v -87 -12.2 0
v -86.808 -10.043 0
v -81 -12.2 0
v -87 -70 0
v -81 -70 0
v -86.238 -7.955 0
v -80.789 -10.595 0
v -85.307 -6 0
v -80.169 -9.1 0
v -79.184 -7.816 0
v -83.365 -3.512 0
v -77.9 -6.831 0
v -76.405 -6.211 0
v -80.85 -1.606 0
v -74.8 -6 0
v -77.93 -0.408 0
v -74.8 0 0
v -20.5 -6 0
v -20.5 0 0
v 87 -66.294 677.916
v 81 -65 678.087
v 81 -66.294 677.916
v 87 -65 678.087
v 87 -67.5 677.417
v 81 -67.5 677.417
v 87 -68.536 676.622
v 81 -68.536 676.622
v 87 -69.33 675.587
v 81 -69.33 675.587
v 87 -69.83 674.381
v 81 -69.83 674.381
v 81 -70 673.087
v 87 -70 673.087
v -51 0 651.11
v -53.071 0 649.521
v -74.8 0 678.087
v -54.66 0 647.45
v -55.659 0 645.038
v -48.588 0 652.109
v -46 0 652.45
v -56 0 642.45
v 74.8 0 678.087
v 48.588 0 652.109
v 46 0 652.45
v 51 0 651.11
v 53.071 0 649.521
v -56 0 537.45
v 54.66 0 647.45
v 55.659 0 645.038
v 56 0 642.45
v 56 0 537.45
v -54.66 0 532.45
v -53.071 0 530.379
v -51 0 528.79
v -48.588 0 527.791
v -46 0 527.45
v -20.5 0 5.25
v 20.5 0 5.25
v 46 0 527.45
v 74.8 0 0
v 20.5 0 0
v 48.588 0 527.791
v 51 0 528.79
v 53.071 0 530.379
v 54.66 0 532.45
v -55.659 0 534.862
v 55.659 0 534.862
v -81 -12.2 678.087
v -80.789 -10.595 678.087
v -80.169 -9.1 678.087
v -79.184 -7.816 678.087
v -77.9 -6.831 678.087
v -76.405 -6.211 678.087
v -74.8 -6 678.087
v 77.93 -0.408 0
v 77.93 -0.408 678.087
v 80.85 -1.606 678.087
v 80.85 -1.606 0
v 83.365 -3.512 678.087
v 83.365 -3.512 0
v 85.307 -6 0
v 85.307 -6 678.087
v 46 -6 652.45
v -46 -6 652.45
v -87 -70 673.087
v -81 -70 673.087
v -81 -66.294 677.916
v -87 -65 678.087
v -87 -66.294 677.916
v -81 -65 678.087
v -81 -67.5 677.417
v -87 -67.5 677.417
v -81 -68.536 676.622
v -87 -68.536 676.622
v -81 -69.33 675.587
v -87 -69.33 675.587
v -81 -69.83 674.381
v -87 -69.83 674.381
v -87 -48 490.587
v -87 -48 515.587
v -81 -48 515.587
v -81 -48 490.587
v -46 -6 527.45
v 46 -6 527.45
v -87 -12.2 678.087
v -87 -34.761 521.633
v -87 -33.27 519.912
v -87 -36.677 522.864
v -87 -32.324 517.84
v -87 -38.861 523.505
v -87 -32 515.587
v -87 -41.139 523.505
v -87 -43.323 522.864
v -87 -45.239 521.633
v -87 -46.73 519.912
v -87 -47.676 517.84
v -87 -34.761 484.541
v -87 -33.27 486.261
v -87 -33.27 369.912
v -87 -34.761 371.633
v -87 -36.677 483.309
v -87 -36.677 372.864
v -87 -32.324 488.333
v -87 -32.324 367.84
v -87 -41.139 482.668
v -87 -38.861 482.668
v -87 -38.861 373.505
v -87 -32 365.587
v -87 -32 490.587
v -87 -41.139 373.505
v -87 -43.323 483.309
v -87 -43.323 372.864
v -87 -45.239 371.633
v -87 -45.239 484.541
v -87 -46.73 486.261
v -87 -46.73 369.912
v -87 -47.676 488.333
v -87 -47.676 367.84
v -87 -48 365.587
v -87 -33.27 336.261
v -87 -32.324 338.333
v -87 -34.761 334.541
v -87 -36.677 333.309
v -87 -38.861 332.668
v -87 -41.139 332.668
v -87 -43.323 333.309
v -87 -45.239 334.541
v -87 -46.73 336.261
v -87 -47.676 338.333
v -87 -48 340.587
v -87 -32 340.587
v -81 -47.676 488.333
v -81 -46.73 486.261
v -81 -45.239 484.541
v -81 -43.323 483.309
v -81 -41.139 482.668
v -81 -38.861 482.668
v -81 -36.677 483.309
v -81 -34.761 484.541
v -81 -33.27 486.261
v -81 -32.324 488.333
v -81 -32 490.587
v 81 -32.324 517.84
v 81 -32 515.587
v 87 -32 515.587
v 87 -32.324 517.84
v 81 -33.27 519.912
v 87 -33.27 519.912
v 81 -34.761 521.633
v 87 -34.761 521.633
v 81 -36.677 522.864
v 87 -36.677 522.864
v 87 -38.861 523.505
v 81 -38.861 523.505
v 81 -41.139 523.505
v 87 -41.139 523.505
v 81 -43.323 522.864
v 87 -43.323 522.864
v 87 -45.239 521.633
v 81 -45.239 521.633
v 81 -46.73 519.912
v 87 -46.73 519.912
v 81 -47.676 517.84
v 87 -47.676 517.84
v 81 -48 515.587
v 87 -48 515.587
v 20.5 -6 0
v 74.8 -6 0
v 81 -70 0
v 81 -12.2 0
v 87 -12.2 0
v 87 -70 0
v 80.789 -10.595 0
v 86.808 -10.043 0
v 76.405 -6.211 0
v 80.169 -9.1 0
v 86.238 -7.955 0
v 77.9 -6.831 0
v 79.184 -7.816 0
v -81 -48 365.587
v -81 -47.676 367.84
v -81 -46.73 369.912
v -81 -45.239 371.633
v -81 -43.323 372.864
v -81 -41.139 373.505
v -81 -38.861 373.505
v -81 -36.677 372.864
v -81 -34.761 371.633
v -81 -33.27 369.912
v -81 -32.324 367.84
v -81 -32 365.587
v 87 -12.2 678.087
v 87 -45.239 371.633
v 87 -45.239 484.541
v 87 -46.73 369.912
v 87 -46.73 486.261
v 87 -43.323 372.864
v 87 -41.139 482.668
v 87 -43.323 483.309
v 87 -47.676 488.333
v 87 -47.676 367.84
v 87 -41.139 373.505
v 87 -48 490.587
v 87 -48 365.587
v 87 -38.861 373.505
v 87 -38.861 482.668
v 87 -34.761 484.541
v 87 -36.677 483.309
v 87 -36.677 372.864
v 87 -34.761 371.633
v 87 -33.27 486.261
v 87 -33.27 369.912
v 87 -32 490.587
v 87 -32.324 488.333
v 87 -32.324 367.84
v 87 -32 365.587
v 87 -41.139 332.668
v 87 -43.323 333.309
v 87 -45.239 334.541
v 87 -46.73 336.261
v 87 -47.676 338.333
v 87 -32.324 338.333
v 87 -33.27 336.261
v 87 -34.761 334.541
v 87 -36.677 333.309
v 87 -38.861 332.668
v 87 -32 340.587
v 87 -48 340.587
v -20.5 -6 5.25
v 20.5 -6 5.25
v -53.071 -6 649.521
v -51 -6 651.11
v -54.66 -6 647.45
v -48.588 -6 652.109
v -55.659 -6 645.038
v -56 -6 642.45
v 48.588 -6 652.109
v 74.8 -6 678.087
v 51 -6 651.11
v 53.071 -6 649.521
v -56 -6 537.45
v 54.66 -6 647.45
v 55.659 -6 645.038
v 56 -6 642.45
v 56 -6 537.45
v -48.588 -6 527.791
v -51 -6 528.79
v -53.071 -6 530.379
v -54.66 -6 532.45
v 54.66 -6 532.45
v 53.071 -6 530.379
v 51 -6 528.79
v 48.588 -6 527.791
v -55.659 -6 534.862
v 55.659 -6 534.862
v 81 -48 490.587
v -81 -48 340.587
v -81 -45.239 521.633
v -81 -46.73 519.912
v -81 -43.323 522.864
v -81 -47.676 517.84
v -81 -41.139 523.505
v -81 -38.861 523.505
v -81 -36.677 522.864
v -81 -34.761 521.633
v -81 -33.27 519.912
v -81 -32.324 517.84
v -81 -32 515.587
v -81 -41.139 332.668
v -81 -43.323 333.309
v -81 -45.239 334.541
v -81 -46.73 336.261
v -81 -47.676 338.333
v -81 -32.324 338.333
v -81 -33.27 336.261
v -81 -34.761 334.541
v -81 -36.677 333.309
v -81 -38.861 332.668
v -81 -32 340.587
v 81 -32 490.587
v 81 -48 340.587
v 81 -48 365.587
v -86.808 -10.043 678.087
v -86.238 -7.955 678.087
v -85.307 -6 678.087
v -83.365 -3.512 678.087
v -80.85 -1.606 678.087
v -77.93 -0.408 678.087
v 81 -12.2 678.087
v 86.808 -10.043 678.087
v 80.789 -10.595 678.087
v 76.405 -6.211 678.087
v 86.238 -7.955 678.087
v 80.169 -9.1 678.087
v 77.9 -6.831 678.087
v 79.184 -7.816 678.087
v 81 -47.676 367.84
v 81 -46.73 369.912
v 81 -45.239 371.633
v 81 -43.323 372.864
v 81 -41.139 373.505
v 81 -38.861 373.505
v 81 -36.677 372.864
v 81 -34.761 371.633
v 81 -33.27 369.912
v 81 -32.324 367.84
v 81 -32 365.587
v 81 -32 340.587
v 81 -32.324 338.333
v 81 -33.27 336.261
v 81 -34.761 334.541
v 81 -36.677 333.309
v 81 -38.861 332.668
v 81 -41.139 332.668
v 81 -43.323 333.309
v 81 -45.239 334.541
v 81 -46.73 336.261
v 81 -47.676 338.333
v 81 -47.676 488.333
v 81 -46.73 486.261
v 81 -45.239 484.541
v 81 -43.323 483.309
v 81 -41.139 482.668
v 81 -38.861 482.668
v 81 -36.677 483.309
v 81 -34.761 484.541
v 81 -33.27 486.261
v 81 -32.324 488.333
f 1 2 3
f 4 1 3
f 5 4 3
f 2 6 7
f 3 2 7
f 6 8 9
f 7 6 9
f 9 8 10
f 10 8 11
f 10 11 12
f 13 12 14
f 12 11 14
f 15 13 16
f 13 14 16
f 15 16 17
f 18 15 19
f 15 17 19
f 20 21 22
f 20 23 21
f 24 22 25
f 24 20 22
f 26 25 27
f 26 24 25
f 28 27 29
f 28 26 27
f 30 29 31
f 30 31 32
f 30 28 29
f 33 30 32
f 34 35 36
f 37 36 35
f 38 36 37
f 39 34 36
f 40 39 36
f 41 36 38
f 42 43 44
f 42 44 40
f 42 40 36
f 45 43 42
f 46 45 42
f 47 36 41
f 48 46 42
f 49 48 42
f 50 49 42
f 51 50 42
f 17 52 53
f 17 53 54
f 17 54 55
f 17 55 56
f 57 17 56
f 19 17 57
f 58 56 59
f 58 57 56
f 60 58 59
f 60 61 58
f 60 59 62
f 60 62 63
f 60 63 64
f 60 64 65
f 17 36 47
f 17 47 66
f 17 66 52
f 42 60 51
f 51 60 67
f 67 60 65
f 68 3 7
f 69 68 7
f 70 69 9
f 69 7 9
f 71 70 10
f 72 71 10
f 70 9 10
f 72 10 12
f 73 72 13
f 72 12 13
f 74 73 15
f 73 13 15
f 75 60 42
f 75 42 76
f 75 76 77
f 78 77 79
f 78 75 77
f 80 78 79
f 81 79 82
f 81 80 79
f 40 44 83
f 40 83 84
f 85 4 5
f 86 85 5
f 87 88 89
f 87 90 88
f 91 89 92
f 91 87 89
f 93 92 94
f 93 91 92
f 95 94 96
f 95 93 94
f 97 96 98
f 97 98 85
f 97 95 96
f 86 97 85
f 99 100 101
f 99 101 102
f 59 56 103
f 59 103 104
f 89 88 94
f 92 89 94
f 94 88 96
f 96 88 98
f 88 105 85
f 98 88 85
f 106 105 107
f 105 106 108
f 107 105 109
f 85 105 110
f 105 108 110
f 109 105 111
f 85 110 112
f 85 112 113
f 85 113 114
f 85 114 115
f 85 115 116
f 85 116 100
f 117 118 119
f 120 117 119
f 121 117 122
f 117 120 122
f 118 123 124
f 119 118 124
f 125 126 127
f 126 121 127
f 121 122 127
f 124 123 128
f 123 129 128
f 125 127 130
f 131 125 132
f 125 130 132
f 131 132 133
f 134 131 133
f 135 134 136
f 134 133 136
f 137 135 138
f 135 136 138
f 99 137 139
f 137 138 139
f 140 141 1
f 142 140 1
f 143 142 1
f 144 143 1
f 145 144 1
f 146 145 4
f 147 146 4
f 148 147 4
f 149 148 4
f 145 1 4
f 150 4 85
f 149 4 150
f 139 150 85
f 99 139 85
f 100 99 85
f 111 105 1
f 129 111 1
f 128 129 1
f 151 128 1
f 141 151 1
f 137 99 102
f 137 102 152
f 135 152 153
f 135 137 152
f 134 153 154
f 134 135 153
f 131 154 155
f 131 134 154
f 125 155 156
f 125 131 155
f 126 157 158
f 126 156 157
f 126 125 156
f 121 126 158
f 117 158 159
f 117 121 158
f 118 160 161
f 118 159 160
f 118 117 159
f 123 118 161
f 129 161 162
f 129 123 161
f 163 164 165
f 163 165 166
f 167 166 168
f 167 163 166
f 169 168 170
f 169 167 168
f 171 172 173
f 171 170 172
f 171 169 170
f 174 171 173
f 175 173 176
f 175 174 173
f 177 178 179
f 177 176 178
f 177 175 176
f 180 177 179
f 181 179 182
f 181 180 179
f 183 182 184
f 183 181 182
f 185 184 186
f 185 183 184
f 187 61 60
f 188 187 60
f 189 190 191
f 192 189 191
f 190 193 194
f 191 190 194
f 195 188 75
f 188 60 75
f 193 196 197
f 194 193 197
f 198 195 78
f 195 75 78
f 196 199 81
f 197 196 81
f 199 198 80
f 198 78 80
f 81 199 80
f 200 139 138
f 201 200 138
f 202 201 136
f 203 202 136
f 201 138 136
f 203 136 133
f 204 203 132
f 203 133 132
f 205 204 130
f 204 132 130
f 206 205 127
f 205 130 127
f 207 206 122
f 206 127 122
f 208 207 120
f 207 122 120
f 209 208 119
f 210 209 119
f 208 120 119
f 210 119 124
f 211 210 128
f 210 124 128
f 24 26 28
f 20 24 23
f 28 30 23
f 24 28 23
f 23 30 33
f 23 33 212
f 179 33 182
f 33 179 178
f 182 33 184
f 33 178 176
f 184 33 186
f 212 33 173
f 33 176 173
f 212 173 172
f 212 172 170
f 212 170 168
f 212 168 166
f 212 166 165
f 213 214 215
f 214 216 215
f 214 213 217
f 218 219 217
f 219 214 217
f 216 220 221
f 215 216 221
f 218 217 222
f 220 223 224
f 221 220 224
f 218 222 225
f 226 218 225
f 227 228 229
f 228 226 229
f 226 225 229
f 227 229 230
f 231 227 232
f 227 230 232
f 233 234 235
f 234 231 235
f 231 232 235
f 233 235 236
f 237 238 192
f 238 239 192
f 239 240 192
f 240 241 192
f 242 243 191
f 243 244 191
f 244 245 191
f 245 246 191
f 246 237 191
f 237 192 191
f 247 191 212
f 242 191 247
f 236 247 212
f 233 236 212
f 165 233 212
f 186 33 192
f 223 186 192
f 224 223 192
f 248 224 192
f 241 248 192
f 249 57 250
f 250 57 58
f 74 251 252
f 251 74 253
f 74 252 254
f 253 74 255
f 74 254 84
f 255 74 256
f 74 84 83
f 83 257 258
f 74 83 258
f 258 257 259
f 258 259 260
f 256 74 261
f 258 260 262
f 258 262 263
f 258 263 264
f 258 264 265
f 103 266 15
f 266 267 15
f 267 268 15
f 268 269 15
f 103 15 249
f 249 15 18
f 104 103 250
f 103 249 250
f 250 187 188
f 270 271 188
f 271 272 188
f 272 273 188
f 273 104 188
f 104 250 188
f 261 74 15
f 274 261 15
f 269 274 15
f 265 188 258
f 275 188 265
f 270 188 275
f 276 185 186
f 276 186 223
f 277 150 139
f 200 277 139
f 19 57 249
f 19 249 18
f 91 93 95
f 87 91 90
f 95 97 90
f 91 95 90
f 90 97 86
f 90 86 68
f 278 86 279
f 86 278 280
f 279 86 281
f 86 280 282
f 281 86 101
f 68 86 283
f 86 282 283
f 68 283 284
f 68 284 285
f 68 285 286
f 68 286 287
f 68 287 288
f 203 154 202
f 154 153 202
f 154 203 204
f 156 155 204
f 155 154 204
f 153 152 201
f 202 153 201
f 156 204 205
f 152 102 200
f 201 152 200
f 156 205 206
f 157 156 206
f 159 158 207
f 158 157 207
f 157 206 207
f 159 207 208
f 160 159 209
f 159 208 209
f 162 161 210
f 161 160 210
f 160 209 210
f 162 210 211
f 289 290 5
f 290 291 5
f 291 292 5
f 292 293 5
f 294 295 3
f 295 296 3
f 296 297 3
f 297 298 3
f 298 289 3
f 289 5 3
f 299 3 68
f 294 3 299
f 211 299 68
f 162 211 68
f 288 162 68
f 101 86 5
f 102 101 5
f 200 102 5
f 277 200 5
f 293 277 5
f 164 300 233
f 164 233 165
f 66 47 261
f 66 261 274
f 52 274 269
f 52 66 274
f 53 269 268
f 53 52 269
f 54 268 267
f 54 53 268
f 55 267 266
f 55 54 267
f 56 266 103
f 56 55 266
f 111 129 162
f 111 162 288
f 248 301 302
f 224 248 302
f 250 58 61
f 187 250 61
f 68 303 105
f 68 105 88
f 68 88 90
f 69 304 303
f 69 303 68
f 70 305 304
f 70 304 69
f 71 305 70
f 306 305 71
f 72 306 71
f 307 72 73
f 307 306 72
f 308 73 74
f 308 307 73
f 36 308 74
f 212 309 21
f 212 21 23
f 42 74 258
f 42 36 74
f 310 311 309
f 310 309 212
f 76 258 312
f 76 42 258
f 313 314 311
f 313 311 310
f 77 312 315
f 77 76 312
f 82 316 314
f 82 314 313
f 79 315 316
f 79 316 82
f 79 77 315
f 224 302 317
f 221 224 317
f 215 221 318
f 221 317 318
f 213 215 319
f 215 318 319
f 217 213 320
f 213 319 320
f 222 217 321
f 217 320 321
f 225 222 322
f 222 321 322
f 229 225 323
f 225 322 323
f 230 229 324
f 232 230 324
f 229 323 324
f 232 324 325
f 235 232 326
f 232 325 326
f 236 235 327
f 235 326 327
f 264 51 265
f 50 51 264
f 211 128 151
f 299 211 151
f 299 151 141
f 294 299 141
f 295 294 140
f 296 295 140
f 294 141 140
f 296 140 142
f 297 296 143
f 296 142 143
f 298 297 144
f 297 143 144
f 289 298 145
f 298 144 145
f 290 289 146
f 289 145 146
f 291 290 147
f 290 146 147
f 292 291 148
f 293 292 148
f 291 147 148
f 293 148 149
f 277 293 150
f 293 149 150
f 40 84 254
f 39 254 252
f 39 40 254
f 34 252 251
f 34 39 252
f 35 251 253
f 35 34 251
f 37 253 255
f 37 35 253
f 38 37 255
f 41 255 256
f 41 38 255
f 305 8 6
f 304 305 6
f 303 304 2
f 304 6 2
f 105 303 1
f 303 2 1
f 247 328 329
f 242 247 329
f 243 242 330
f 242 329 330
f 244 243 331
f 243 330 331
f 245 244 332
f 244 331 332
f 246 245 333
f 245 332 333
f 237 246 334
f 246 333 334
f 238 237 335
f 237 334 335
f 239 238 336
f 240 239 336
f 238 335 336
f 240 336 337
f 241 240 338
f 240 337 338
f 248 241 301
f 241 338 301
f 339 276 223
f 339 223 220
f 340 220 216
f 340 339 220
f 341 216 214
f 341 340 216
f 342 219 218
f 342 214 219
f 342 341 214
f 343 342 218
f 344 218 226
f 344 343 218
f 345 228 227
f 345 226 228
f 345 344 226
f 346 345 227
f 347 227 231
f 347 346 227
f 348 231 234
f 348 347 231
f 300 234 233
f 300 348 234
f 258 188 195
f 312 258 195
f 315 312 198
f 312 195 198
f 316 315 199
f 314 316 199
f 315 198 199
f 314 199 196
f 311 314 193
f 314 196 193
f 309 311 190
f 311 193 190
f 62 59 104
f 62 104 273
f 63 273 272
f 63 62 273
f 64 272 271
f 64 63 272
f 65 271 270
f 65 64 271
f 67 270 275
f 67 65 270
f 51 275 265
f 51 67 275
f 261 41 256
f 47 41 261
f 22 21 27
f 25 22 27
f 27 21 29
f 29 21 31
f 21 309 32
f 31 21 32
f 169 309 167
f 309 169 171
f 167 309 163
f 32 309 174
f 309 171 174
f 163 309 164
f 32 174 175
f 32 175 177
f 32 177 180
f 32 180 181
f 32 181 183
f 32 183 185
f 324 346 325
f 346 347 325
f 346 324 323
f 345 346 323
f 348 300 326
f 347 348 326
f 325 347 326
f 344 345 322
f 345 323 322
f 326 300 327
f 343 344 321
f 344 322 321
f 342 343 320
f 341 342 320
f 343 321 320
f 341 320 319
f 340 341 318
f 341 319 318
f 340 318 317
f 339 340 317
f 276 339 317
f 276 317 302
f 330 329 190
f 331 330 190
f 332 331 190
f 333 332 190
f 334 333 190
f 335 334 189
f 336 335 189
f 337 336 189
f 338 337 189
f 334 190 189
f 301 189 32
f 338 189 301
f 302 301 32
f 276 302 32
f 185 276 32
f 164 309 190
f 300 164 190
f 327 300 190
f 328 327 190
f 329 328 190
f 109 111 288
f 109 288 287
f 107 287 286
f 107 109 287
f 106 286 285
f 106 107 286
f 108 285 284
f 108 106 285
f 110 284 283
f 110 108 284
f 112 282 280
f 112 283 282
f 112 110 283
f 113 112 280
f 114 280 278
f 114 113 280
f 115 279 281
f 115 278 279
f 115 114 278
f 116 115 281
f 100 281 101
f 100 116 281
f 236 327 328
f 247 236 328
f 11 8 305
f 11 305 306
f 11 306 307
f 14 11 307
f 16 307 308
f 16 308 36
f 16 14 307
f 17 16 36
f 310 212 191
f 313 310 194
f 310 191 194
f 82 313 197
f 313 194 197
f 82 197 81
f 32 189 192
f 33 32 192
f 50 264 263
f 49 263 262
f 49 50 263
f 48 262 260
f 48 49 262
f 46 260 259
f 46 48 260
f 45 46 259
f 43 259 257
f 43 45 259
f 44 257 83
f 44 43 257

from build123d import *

# Parameters (mm, degrees)
BOSS_EXTRUDE1_DEPTH        = 955
FLATTEN_BENDS1_OUTLINE_W   = 6
FLATTEN_BENDS1_OUTLINE_H   = 64
FLATTEN_BENDS1_DEPTH       = 955
FLATTEN_BENDS1_2_OUTLINE_W = 59.495264307
FLATTEN_BENDS1_2_OUTLINE_H = 6
FLATTEN_BENDS1_2_DEPTH     = 955
PROCESS_BENDS1_DEPTH       = 955
PROCESS_BENDS1_2_DEPTH     = 955
BOSS_EXTRUDE2_DEPTH        = 6
EDGE_FLANGE1_DEPTH         = 206.725155702
EDGE_FLANGE1_BEND_DEPTH    = 206.725155702
CUT_EXTRUDE1_DEPTH         = 15
CUT_EXTRUDE2_START         = -25.25
CUT_EXTRUDE2_DEPTH         = 25.25
SKETCH17_W                 = 20.5
SKETCH17_H                 = 7
CUT_EXTRUDE3_DEPTH         = 10
FILLET1_R                  = 10
SKETCH18_W                 = 41
SKETCH18_H                 = 5.25
CUT_EXTRUDE4_DEPTH         = 10
SKETCH19_W                 = 174
SKETCH19_H                 = 480
CUT_EXTRUDE5_DEPTH         = 1164.457508004
FILLET2_R                  = 5
CUT_EXTRUDE6_DEPTH         = 704.546245741


# Read off the part's stored shape, not the designer's step: Flatten-Bends1, Process-Bends1, Cut-Extrude2
# Sheet-metal steps are written as plain solids
with BuildPart() as part:
    # Sketch1 → Boss-Extrude1 (new body)
    with BuildSketch(Plane.XY):
        Polygon((-87, -70), (-87, 0), (87, 0), (87, -70), (81, -70), (81, -6), (-81, -6), (-81, -70), align=None)
    extrude(amount=BOSS_EXTRUDE1_DEPTH)

    # Flatten-Bends1 outline → Flatten-Bends1 (cut)
    with BuildSketch(Plane.XY):
        with Locations((-84, -38)):
            Rectangle(FLATTEN_BENDS1_OUTLINE_W, FLATTEN_BENDS1_OUTLINE_H)
        with Locations((84, -38)):
            Rectangle(FLATTEN_BENDS1_OUTLINE_W, FLATTEN_BENDS1_OUTLINE_H)
    extrude(amount=FLATTEN_BENDS1_DEPTH, mode=Mode.SUBTRACT)

    # Flatten-Bends1 2 outline → Flatten-Bends1 2 (add)
    with BuildSketch(Plane.XY):
        with Locations((-116.747632154, -3)):
            Rectangle(FLATTEN_BENDS1_2_OUTLINE_W, FLATTEN_BENDS1_2_OUTLINE_H)
        with Locations((116.747632154, -3)):
            Rectangle(FLATTEN_BENDS1_2_OUTLINE_W, FLATTEN_BENDS1_2_OUTLINE_H)
    extrude(amount=FLATTEN_BENDS1_2_DEPTH)

    # Process-Bends1 outline → Process-Bends1 (cut)
    with BuildSketch(Plane.XY):
        with BuildLine():
            ThreePointArc((74.8, 0), (80.849793384, -1.60566189), (85.307140429, -6))
            Line((85.307140429, -6), (146.495264307, -6))
            Line((146.495264307, -6), (146.495264307, 0))
            Line((146.495264307, 0), (74.8, 0))
        make_face()
        with BuildLine():
            Line((-146.495264307, -6), (-85.307140429, -6))
            ThreePointArc((-85.307140429, -6), (-80.849793384, -1.60566189), (-74.8, 0))
            Line((-74.8, 0), (-146.495264307, 0))
            Line((-146.495264307, 0), (-146.495264307, -6))
        make_face()
    extrude(amount=PROCESS_BENDS1_DEPTH, mode=Mode.SUBTRACT)

    # Process-Bends1 2 outline → Process-Bends1 2 (add)
    with BuildSketch(Plane.XY):
        with BuildLine():
            Line((81, -12.2), (81, -70))
            Line((81, -70), (87, -70))
            Line((87, -70), (87, -12.2))
            ThreePointArc((87, -12.2), (86.569178247, -8.986521607), (85.307140429, -6))
            Line((85.307140429, -6), (74.8, -6))
            ThreePointArc((74.8, -6), (79.184062043, -7.815937957), (81, -12.2))
        make_face()
        with BuildLine():
            Line((-87, -70), (-81, -70))
            Line((-81, -70), (-81, -12.2))
            ThreePointArc((-81, -12.2), (-79.184062043, -7.815937957), (-74.8, -6))
            Line((-74.8, -6), (-85.307140429, -6))
            ThreePointArc((-85.307140429, -6), (-86.569178247, -8.986521607), (-87, -12.2))
            Line((-87, -12.2), (-87, -70))
        make_face()
    extrude(amount=PROCESS_BENDS1_2_DEPTH)

    # Sketch8 → Boss-Extrude2 (add)
    with BuildSketch(Plane(origin=(0, 0, 0), x_dir=(1, 0, 0), z_dir=(0, 1, 0))):
        Polygon((-74.8, -955), (-22.5, -1155), (22.5, -1155), (74.8, -955), align=None)
    extrude(amount=-BOSS_EXTRUDE2_DEPTH)

    # Edge-Flange1 section (across the edge) → Edge-Flange1 (add)
    with BuildSketch(Plane(origin=(80.798302412, -6, 956.568556081), x_dir=(-0.9674681309145718, -3.491481338843133e-15, -0.25299291623416037), z_dir=(-0.25299291623416037, 0, 0.9674681309145718))):
        with BuildLine():
            Line((-6, 6.2), (-6, 64))
            Line((-6, 64), (0, 64))
            Line((0, 64), (0, 6.2))
            ThreePointArc((0, 6.2), (1.815937957, 1.815937957), (6.2, 0))
            Line((6.2, 0), (6.2, -6))
            ThreePointArc((6.2, -6), (-2.42670273, -2.42670273), (-6, 6.2))
        make_face()
    extrude(amount=EDGE_FLANGE1_DEPTH)

    # Edge-Flange1 section 2 (across the edge) → Edge-Flange1 bend (add)
    with BuildSketch(Plane(origin=(-28.498302412, -6, 1156.568556081), x_dir=(0.9674681309145718, -3.4914813388431337e-15, -0.25299291623416087), z_dir=(-0.25299291623416087, 0, -0.9674681309145718))):
        with BuildLine():
            Line((-6, 6.2), (-6, 64))
            Line((-6, 64), (0, 64))
            Line((0, 64), (0, 6.2))
            ThreePointArc((0, 6.2), (1.815937957, 1.815937957), (6.2, 0))
            Line((6.2, 0), (6.2, -6))
            ThreePointArc((6.2, -6), (-2.42670273, -2.42670273), (-6, 6.2))
        make_face()
    extrude(amount=EDGE_FLANGE1_BEND_DEPTH)

    # Sketch15 → Cut-Extrude1 (cut)
    with BuildSketch(Plane(origin=(0, 0, 0), x_dir=(1, 0, 0), z_dir=(0, 1, 0))):
        with BuildLine():
            Line((46, -652.45), (-46, -652.45))
            ThreePointArc((-46, -652.45), (-53.071067812, -649.521067812), (-56, -642.45))
            Line((-56, -642.45), (-56, -537.45))
            ThreePointArc((-56, -537.45), (-53.071067812, -530.378932188), (-46, -527.45))
            Line((-46, -527.45), (46, -527.45))
            ThreePointArc((46, -527.45), (53.071067812, -530.378932188), (56, -537.45))
            Line((56, -537.45), (56, -642.45))
            ThreePointArc((56, -642.45), (53.071067812, -649.521067812), (46, -652.45))
        make_face()
    extrude(amount=-CUT_EXTRUDE1_DEPTH, mode=Mode.SUBTRACT)

    # Cut-Extrude2 outline → Cut-Extrude2 (cut)
    with BuildSketch(Plane.XZ.offset(70).offset(CUT_EXTRUDE2_START)):
        Polygon((-53.676734498, 1084), (-47.871925712, 1082.482042503), (-45.644479827, 1091), (-51.449288612, 1092.517957497), align=None)
        Polygon((45.644479827, 1091), (47.871925713, 1082.482042503), (53.676734498, 1084), (51.449288612, 1092.517957497), align=None)
    extrude(amount=CUT_EXTRUDE2_DEPTH, mode=Mode.SUBTRACT)

    # Sketch17 → Cut-Extrude3 (cut)
    with BuildSketch(Plane.XZ.offset(6)):
        with Locations((0, 1087.5)):
            Rectangle(SKETCH17_W, SKETCH17_H)
    extrude(amount=-CUT_EXTRUDE3_DEPTH, mode=Mode.SUBTRACT)

    # Fillet1
    fillet1_edges = [part.edges().sort_by_distance(p)[0] for p in [
        (31.400706804, -70, 1157.327534829),
        (-31.400706804, -70, 1157.327534829),
    ]]
    fillet(fillet1_edges, radius=FILLET1_R)

    # Sketch18 → Cut-Extrude4 (cut)
    with BuildSketch(Plane(origin=(0, 0, 0), x_dir=(1, 0, 0), z_dir=(0, 1, 0))):
        with Locations((0, -2.625)):
            Rectangle(SKETCH18_W, SKETCH18_H)
    extrude(amount=-CUT_EXTRUDE4_DEPTH, mode=Mode.SUBTRACT)

    # Sketch19 → Cut-Extrude5 (cut, through all)
    with BuildSketch(Plane(origin=(0, 0, 0), x_dir=(1, 0, 0), z_dir=(0, 1, 0))):
        with Locations((0, -918.086513578)):
            Rectangle(SKETCH19_W, SKETCH19_H)
    extrude(amount=-CUT_EXTRUDE5_DEPTH, mode=Mode.SUBTRACT)

    # Fillet2
    fillet2_edges = [part.edges().sort_by_distance(p)[0] for p in [
        (84, -70, 678.086513578),
        (-84, -70, 678.086513578),
    ]]
    fillet(fillet2_edges, radius=FILLET2_R)

    # Sketch20 → Cut-Extrude6 (cut, through all)
    with BuildSketch(Plane.ZY.offset(87)):
        with BuildLine():
            Line((490.586513578, -32), (515.586513578, -32))
            ThreePointArc((515.586513578, -32), (523.586513578, -40), (515.586513578, -48))
            Line((515.586513578, -48), (490.586513578, -48))
            ThreePointArc((490.586513578, -48), (482.586513578, -40), (490.586513578, -32))
        make_face()
        with BuildLine():
            Line((365.586513578, -32), (340.586513578, -32))
            ThreePointArc((340.586513578, -32), (332.586513578, -40), (340.586513578, -48))
            Line((340.586513578, -48), (365.586513578, -48))
            ThreePointArc((365.586513578, -48), (373.586513578, -40), (365.586513578, -32))
        make_face()
    extrude(amount=-CUT_EXTRUDE6_DEPTH, mode=Mode.SUBTRACT)


solid = part.part
